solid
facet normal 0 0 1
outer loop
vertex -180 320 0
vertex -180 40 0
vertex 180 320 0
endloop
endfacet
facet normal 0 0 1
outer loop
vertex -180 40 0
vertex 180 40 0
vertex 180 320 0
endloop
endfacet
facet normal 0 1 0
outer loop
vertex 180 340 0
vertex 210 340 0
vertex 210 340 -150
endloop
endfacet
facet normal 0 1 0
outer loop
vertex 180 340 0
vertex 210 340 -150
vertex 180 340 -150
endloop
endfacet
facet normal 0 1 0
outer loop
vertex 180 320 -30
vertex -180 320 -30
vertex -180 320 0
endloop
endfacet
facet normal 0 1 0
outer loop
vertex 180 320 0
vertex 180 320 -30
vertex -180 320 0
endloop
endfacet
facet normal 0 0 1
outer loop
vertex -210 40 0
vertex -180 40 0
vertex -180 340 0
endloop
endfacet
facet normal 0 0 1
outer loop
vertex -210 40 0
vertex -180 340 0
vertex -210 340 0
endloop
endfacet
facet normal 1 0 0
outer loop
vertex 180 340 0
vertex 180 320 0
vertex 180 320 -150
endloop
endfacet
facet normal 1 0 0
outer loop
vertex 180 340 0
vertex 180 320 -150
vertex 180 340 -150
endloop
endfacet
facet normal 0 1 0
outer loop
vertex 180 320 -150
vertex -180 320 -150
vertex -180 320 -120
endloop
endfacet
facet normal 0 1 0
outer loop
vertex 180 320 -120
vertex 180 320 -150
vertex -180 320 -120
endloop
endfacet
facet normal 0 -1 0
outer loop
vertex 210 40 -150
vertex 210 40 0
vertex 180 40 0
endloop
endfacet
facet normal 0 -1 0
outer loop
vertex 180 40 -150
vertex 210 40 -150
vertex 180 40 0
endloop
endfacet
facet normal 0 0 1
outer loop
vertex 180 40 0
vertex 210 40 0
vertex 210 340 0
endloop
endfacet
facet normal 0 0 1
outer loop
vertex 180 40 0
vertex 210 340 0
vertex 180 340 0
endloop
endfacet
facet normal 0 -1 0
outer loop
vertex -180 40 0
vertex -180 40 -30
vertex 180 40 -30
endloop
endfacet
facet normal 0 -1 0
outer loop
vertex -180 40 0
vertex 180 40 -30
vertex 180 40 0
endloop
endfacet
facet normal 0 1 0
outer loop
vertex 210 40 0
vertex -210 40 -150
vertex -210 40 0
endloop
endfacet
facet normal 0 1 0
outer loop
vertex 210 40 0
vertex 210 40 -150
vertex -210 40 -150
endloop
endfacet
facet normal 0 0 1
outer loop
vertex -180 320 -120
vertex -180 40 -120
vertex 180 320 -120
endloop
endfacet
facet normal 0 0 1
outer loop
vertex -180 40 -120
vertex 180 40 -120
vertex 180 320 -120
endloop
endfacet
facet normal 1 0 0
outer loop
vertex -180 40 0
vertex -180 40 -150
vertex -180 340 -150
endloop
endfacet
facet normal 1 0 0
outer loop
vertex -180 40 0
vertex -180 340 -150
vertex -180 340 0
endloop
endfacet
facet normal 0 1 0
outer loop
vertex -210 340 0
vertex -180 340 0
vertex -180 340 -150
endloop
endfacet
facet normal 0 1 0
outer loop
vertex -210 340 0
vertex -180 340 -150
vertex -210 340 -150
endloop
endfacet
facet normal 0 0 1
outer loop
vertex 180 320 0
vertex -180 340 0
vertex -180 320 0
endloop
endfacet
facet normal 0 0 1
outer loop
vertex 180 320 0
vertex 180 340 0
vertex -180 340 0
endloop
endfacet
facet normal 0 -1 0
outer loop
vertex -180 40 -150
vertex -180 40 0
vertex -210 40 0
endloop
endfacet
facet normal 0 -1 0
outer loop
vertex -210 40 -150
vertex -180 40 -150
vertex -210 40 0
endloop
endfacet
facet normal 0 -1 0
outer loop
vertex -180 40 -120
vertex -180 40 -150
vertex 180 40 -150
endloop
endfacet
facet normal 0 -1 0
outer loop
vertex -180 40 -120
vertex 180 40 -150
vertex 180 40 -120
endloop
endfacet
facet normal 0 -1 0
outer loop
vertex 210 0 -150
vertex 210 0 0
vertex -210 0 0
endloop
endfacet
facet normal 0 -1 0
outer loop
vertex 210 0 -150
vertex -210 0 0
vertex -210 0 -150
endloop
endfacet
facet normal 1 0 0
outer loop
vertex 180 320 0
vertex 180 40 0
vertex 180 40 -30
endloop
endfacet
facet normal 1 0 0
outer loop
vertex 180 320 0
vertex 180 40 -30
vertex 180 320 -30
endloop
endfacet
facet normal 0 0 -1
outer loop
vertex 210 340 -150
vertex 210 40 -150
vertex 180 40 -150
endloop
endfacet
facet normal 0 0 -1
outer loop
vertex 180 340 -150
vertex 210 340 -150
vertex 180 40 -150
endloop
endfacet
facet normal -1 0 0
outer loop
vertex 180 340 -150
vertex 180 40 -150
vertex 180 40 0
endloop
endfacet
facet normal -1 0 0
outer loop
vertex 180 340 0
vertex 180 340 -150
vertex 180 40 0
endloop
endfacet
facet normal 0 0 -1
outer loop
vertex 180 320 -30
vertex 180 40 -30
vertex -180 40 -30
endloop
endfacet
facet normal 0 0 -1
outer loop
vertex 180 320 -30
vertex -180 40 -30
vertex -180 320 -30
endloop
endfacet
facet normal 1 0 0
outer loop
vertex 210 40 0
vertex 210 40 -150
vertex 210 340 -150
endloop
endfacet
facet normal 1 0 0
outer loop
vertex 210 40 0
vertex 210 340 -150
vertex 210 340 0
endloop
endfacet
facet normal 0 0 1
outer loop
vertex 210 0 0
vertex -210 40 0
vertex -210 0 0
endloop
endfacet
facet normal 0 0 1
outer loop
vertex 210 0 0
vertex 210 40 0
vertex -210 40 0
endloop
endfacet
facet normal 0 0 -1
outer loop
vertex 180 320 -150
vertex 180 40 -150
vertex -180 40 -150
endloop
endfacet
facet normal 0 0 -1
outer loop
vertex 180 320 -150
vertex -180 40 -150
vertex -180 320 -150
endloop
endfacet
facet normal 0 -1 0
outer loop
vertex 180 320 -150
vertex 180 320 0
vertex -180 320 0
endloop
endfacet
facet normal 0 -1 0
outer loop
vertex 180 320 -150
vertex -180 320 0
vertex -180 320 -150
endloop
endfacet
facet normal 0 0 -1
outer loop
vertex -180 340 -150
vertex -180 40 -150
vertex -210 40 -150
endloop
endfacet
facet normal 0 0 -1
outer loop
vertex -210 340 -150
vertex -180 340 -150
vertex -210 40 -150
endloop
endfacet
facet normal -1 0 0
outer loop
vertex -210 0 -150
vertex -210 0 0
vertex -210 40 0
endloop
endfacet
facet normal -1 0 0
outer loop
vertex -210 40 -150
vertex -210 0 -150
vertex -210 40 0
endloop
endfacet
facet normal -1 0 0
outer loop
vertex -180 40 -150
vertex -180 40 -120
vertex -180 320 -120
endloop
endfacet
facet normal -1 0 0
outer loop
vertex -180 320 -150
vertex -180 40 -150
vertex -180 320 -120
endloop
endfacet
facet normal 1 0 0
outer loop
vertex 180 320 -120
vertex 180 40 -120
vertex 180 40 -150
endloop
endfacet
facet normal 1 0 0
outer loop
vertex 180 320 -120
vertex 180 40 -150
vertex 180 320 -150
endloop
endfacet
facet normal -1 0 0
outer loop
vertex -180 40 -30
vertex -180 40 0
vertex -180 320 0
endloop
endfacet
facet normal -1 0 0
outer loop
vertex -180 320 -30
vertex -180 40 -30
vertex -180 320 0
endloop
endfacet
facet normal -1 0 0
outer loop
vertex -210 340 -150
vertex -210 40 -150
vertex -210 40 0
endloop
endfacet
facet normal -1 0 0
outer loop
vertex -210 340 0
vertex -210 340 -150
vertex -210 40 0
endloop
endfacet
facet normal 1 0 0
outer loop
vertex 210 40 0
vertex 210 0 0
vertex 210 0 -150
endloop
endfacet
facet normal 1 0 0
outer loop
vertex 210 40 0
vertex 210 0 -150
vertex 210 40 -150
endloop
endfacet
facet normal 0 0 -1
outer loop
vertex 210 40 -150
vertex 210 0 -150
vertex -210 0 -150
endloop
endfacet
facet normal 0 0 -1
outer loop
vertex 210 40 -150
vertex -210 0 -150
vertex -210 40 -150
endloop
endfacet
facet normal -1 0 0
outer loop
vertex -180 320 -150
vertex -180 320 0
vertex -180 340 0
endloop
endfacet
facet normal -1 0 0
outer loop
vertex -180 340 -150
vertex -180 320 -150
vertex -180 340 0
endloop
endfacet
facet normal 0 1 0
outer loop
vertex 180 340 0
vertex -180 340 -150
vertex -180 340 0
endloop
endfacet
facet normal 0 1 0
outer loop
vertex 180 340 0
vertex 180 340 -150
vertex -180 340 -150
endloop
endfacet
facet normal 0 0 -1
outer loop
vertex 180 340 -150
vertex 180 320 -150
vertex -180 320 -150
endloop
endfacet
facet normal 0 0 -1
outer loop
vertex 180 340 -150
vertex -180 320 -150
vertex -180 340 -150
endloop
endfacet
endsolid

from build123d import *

# Parameters (mm, degrees)
F1_DEPTH = 210
F0_W     = 280
F0_H     = 30
F2_DEPTH = 180
F3_DEPTH = 180
F4_W     = 30
F4_H     = 150
F5_DEPTH = 300
F6_DEPTH = 300
F7_DEPTH = 180


with BuildPart() as f1:
    # F0 (on Right) → F1 (new body, symmetric)
    with BuildSketch(Plane.YZ):
        Polygon((40, 0), (0, 0), (0, -150), (40, -150), (40, -120), (40, -30), align=None)
    extrude(amount=F1_DEPTH, both=True)


with BuildPart() as f2:
    # F0 (on Right) → F2 (new body, symmetric)
    with BuildSketch(Plane.YZ):
        with Locations((180, -15)):
            Rectangle(F0_W, F0_H)
    extrude(amount=F2_DEPTH, both=True)


with BuildPart() as f3:
    # F0 (on Right) → F3 (new body, symmetric)
    with BuildSketch(Plane.YZ):
        with Locations((180, -135)):
            Rectangle(F0_W, F0_H)
    extrude(amount=F3_DEPTH, both=True)


with BuildPart() as f5:
    # F4 (on face) → F5 (new body)
    with BuildSketch(Plane(origin=(0, 40, 0), x_dir=(-1, 0, 0), z_dir=(0, 1, 0))):
        with Locations((-195, -75)):
            Rectangle(F4_W, F4_H)
    extrude(amount=F5_DEPTH)


with BuildPart() as f6:
    # F4 (on face) → F6 (new body)
    with BuildSketch(Plane(origin=(0, 40, 0), x_dir=(-1, 0, 0), z_dir=(0, 1, 0))):
        with Locations((195, -75)):
            Rectangle(F4_W, F4_H)
    extrude(amount=F6_DEPTH)


with BuildPart() as f7:
    # F0 (on Right) → F7 (new body, symmetric)
    with BuildSketch(Plane.YZ):
        Polygon((340, 0), (320, 0), (320, -30), (320, -120), (320, -150), (340, -150), align=None)
    extrude(amount=F7_DEPTH, both=True)


solid = Compound([f1.part, f2.part, f3.part, f5.part, f6.part, f7.part])
